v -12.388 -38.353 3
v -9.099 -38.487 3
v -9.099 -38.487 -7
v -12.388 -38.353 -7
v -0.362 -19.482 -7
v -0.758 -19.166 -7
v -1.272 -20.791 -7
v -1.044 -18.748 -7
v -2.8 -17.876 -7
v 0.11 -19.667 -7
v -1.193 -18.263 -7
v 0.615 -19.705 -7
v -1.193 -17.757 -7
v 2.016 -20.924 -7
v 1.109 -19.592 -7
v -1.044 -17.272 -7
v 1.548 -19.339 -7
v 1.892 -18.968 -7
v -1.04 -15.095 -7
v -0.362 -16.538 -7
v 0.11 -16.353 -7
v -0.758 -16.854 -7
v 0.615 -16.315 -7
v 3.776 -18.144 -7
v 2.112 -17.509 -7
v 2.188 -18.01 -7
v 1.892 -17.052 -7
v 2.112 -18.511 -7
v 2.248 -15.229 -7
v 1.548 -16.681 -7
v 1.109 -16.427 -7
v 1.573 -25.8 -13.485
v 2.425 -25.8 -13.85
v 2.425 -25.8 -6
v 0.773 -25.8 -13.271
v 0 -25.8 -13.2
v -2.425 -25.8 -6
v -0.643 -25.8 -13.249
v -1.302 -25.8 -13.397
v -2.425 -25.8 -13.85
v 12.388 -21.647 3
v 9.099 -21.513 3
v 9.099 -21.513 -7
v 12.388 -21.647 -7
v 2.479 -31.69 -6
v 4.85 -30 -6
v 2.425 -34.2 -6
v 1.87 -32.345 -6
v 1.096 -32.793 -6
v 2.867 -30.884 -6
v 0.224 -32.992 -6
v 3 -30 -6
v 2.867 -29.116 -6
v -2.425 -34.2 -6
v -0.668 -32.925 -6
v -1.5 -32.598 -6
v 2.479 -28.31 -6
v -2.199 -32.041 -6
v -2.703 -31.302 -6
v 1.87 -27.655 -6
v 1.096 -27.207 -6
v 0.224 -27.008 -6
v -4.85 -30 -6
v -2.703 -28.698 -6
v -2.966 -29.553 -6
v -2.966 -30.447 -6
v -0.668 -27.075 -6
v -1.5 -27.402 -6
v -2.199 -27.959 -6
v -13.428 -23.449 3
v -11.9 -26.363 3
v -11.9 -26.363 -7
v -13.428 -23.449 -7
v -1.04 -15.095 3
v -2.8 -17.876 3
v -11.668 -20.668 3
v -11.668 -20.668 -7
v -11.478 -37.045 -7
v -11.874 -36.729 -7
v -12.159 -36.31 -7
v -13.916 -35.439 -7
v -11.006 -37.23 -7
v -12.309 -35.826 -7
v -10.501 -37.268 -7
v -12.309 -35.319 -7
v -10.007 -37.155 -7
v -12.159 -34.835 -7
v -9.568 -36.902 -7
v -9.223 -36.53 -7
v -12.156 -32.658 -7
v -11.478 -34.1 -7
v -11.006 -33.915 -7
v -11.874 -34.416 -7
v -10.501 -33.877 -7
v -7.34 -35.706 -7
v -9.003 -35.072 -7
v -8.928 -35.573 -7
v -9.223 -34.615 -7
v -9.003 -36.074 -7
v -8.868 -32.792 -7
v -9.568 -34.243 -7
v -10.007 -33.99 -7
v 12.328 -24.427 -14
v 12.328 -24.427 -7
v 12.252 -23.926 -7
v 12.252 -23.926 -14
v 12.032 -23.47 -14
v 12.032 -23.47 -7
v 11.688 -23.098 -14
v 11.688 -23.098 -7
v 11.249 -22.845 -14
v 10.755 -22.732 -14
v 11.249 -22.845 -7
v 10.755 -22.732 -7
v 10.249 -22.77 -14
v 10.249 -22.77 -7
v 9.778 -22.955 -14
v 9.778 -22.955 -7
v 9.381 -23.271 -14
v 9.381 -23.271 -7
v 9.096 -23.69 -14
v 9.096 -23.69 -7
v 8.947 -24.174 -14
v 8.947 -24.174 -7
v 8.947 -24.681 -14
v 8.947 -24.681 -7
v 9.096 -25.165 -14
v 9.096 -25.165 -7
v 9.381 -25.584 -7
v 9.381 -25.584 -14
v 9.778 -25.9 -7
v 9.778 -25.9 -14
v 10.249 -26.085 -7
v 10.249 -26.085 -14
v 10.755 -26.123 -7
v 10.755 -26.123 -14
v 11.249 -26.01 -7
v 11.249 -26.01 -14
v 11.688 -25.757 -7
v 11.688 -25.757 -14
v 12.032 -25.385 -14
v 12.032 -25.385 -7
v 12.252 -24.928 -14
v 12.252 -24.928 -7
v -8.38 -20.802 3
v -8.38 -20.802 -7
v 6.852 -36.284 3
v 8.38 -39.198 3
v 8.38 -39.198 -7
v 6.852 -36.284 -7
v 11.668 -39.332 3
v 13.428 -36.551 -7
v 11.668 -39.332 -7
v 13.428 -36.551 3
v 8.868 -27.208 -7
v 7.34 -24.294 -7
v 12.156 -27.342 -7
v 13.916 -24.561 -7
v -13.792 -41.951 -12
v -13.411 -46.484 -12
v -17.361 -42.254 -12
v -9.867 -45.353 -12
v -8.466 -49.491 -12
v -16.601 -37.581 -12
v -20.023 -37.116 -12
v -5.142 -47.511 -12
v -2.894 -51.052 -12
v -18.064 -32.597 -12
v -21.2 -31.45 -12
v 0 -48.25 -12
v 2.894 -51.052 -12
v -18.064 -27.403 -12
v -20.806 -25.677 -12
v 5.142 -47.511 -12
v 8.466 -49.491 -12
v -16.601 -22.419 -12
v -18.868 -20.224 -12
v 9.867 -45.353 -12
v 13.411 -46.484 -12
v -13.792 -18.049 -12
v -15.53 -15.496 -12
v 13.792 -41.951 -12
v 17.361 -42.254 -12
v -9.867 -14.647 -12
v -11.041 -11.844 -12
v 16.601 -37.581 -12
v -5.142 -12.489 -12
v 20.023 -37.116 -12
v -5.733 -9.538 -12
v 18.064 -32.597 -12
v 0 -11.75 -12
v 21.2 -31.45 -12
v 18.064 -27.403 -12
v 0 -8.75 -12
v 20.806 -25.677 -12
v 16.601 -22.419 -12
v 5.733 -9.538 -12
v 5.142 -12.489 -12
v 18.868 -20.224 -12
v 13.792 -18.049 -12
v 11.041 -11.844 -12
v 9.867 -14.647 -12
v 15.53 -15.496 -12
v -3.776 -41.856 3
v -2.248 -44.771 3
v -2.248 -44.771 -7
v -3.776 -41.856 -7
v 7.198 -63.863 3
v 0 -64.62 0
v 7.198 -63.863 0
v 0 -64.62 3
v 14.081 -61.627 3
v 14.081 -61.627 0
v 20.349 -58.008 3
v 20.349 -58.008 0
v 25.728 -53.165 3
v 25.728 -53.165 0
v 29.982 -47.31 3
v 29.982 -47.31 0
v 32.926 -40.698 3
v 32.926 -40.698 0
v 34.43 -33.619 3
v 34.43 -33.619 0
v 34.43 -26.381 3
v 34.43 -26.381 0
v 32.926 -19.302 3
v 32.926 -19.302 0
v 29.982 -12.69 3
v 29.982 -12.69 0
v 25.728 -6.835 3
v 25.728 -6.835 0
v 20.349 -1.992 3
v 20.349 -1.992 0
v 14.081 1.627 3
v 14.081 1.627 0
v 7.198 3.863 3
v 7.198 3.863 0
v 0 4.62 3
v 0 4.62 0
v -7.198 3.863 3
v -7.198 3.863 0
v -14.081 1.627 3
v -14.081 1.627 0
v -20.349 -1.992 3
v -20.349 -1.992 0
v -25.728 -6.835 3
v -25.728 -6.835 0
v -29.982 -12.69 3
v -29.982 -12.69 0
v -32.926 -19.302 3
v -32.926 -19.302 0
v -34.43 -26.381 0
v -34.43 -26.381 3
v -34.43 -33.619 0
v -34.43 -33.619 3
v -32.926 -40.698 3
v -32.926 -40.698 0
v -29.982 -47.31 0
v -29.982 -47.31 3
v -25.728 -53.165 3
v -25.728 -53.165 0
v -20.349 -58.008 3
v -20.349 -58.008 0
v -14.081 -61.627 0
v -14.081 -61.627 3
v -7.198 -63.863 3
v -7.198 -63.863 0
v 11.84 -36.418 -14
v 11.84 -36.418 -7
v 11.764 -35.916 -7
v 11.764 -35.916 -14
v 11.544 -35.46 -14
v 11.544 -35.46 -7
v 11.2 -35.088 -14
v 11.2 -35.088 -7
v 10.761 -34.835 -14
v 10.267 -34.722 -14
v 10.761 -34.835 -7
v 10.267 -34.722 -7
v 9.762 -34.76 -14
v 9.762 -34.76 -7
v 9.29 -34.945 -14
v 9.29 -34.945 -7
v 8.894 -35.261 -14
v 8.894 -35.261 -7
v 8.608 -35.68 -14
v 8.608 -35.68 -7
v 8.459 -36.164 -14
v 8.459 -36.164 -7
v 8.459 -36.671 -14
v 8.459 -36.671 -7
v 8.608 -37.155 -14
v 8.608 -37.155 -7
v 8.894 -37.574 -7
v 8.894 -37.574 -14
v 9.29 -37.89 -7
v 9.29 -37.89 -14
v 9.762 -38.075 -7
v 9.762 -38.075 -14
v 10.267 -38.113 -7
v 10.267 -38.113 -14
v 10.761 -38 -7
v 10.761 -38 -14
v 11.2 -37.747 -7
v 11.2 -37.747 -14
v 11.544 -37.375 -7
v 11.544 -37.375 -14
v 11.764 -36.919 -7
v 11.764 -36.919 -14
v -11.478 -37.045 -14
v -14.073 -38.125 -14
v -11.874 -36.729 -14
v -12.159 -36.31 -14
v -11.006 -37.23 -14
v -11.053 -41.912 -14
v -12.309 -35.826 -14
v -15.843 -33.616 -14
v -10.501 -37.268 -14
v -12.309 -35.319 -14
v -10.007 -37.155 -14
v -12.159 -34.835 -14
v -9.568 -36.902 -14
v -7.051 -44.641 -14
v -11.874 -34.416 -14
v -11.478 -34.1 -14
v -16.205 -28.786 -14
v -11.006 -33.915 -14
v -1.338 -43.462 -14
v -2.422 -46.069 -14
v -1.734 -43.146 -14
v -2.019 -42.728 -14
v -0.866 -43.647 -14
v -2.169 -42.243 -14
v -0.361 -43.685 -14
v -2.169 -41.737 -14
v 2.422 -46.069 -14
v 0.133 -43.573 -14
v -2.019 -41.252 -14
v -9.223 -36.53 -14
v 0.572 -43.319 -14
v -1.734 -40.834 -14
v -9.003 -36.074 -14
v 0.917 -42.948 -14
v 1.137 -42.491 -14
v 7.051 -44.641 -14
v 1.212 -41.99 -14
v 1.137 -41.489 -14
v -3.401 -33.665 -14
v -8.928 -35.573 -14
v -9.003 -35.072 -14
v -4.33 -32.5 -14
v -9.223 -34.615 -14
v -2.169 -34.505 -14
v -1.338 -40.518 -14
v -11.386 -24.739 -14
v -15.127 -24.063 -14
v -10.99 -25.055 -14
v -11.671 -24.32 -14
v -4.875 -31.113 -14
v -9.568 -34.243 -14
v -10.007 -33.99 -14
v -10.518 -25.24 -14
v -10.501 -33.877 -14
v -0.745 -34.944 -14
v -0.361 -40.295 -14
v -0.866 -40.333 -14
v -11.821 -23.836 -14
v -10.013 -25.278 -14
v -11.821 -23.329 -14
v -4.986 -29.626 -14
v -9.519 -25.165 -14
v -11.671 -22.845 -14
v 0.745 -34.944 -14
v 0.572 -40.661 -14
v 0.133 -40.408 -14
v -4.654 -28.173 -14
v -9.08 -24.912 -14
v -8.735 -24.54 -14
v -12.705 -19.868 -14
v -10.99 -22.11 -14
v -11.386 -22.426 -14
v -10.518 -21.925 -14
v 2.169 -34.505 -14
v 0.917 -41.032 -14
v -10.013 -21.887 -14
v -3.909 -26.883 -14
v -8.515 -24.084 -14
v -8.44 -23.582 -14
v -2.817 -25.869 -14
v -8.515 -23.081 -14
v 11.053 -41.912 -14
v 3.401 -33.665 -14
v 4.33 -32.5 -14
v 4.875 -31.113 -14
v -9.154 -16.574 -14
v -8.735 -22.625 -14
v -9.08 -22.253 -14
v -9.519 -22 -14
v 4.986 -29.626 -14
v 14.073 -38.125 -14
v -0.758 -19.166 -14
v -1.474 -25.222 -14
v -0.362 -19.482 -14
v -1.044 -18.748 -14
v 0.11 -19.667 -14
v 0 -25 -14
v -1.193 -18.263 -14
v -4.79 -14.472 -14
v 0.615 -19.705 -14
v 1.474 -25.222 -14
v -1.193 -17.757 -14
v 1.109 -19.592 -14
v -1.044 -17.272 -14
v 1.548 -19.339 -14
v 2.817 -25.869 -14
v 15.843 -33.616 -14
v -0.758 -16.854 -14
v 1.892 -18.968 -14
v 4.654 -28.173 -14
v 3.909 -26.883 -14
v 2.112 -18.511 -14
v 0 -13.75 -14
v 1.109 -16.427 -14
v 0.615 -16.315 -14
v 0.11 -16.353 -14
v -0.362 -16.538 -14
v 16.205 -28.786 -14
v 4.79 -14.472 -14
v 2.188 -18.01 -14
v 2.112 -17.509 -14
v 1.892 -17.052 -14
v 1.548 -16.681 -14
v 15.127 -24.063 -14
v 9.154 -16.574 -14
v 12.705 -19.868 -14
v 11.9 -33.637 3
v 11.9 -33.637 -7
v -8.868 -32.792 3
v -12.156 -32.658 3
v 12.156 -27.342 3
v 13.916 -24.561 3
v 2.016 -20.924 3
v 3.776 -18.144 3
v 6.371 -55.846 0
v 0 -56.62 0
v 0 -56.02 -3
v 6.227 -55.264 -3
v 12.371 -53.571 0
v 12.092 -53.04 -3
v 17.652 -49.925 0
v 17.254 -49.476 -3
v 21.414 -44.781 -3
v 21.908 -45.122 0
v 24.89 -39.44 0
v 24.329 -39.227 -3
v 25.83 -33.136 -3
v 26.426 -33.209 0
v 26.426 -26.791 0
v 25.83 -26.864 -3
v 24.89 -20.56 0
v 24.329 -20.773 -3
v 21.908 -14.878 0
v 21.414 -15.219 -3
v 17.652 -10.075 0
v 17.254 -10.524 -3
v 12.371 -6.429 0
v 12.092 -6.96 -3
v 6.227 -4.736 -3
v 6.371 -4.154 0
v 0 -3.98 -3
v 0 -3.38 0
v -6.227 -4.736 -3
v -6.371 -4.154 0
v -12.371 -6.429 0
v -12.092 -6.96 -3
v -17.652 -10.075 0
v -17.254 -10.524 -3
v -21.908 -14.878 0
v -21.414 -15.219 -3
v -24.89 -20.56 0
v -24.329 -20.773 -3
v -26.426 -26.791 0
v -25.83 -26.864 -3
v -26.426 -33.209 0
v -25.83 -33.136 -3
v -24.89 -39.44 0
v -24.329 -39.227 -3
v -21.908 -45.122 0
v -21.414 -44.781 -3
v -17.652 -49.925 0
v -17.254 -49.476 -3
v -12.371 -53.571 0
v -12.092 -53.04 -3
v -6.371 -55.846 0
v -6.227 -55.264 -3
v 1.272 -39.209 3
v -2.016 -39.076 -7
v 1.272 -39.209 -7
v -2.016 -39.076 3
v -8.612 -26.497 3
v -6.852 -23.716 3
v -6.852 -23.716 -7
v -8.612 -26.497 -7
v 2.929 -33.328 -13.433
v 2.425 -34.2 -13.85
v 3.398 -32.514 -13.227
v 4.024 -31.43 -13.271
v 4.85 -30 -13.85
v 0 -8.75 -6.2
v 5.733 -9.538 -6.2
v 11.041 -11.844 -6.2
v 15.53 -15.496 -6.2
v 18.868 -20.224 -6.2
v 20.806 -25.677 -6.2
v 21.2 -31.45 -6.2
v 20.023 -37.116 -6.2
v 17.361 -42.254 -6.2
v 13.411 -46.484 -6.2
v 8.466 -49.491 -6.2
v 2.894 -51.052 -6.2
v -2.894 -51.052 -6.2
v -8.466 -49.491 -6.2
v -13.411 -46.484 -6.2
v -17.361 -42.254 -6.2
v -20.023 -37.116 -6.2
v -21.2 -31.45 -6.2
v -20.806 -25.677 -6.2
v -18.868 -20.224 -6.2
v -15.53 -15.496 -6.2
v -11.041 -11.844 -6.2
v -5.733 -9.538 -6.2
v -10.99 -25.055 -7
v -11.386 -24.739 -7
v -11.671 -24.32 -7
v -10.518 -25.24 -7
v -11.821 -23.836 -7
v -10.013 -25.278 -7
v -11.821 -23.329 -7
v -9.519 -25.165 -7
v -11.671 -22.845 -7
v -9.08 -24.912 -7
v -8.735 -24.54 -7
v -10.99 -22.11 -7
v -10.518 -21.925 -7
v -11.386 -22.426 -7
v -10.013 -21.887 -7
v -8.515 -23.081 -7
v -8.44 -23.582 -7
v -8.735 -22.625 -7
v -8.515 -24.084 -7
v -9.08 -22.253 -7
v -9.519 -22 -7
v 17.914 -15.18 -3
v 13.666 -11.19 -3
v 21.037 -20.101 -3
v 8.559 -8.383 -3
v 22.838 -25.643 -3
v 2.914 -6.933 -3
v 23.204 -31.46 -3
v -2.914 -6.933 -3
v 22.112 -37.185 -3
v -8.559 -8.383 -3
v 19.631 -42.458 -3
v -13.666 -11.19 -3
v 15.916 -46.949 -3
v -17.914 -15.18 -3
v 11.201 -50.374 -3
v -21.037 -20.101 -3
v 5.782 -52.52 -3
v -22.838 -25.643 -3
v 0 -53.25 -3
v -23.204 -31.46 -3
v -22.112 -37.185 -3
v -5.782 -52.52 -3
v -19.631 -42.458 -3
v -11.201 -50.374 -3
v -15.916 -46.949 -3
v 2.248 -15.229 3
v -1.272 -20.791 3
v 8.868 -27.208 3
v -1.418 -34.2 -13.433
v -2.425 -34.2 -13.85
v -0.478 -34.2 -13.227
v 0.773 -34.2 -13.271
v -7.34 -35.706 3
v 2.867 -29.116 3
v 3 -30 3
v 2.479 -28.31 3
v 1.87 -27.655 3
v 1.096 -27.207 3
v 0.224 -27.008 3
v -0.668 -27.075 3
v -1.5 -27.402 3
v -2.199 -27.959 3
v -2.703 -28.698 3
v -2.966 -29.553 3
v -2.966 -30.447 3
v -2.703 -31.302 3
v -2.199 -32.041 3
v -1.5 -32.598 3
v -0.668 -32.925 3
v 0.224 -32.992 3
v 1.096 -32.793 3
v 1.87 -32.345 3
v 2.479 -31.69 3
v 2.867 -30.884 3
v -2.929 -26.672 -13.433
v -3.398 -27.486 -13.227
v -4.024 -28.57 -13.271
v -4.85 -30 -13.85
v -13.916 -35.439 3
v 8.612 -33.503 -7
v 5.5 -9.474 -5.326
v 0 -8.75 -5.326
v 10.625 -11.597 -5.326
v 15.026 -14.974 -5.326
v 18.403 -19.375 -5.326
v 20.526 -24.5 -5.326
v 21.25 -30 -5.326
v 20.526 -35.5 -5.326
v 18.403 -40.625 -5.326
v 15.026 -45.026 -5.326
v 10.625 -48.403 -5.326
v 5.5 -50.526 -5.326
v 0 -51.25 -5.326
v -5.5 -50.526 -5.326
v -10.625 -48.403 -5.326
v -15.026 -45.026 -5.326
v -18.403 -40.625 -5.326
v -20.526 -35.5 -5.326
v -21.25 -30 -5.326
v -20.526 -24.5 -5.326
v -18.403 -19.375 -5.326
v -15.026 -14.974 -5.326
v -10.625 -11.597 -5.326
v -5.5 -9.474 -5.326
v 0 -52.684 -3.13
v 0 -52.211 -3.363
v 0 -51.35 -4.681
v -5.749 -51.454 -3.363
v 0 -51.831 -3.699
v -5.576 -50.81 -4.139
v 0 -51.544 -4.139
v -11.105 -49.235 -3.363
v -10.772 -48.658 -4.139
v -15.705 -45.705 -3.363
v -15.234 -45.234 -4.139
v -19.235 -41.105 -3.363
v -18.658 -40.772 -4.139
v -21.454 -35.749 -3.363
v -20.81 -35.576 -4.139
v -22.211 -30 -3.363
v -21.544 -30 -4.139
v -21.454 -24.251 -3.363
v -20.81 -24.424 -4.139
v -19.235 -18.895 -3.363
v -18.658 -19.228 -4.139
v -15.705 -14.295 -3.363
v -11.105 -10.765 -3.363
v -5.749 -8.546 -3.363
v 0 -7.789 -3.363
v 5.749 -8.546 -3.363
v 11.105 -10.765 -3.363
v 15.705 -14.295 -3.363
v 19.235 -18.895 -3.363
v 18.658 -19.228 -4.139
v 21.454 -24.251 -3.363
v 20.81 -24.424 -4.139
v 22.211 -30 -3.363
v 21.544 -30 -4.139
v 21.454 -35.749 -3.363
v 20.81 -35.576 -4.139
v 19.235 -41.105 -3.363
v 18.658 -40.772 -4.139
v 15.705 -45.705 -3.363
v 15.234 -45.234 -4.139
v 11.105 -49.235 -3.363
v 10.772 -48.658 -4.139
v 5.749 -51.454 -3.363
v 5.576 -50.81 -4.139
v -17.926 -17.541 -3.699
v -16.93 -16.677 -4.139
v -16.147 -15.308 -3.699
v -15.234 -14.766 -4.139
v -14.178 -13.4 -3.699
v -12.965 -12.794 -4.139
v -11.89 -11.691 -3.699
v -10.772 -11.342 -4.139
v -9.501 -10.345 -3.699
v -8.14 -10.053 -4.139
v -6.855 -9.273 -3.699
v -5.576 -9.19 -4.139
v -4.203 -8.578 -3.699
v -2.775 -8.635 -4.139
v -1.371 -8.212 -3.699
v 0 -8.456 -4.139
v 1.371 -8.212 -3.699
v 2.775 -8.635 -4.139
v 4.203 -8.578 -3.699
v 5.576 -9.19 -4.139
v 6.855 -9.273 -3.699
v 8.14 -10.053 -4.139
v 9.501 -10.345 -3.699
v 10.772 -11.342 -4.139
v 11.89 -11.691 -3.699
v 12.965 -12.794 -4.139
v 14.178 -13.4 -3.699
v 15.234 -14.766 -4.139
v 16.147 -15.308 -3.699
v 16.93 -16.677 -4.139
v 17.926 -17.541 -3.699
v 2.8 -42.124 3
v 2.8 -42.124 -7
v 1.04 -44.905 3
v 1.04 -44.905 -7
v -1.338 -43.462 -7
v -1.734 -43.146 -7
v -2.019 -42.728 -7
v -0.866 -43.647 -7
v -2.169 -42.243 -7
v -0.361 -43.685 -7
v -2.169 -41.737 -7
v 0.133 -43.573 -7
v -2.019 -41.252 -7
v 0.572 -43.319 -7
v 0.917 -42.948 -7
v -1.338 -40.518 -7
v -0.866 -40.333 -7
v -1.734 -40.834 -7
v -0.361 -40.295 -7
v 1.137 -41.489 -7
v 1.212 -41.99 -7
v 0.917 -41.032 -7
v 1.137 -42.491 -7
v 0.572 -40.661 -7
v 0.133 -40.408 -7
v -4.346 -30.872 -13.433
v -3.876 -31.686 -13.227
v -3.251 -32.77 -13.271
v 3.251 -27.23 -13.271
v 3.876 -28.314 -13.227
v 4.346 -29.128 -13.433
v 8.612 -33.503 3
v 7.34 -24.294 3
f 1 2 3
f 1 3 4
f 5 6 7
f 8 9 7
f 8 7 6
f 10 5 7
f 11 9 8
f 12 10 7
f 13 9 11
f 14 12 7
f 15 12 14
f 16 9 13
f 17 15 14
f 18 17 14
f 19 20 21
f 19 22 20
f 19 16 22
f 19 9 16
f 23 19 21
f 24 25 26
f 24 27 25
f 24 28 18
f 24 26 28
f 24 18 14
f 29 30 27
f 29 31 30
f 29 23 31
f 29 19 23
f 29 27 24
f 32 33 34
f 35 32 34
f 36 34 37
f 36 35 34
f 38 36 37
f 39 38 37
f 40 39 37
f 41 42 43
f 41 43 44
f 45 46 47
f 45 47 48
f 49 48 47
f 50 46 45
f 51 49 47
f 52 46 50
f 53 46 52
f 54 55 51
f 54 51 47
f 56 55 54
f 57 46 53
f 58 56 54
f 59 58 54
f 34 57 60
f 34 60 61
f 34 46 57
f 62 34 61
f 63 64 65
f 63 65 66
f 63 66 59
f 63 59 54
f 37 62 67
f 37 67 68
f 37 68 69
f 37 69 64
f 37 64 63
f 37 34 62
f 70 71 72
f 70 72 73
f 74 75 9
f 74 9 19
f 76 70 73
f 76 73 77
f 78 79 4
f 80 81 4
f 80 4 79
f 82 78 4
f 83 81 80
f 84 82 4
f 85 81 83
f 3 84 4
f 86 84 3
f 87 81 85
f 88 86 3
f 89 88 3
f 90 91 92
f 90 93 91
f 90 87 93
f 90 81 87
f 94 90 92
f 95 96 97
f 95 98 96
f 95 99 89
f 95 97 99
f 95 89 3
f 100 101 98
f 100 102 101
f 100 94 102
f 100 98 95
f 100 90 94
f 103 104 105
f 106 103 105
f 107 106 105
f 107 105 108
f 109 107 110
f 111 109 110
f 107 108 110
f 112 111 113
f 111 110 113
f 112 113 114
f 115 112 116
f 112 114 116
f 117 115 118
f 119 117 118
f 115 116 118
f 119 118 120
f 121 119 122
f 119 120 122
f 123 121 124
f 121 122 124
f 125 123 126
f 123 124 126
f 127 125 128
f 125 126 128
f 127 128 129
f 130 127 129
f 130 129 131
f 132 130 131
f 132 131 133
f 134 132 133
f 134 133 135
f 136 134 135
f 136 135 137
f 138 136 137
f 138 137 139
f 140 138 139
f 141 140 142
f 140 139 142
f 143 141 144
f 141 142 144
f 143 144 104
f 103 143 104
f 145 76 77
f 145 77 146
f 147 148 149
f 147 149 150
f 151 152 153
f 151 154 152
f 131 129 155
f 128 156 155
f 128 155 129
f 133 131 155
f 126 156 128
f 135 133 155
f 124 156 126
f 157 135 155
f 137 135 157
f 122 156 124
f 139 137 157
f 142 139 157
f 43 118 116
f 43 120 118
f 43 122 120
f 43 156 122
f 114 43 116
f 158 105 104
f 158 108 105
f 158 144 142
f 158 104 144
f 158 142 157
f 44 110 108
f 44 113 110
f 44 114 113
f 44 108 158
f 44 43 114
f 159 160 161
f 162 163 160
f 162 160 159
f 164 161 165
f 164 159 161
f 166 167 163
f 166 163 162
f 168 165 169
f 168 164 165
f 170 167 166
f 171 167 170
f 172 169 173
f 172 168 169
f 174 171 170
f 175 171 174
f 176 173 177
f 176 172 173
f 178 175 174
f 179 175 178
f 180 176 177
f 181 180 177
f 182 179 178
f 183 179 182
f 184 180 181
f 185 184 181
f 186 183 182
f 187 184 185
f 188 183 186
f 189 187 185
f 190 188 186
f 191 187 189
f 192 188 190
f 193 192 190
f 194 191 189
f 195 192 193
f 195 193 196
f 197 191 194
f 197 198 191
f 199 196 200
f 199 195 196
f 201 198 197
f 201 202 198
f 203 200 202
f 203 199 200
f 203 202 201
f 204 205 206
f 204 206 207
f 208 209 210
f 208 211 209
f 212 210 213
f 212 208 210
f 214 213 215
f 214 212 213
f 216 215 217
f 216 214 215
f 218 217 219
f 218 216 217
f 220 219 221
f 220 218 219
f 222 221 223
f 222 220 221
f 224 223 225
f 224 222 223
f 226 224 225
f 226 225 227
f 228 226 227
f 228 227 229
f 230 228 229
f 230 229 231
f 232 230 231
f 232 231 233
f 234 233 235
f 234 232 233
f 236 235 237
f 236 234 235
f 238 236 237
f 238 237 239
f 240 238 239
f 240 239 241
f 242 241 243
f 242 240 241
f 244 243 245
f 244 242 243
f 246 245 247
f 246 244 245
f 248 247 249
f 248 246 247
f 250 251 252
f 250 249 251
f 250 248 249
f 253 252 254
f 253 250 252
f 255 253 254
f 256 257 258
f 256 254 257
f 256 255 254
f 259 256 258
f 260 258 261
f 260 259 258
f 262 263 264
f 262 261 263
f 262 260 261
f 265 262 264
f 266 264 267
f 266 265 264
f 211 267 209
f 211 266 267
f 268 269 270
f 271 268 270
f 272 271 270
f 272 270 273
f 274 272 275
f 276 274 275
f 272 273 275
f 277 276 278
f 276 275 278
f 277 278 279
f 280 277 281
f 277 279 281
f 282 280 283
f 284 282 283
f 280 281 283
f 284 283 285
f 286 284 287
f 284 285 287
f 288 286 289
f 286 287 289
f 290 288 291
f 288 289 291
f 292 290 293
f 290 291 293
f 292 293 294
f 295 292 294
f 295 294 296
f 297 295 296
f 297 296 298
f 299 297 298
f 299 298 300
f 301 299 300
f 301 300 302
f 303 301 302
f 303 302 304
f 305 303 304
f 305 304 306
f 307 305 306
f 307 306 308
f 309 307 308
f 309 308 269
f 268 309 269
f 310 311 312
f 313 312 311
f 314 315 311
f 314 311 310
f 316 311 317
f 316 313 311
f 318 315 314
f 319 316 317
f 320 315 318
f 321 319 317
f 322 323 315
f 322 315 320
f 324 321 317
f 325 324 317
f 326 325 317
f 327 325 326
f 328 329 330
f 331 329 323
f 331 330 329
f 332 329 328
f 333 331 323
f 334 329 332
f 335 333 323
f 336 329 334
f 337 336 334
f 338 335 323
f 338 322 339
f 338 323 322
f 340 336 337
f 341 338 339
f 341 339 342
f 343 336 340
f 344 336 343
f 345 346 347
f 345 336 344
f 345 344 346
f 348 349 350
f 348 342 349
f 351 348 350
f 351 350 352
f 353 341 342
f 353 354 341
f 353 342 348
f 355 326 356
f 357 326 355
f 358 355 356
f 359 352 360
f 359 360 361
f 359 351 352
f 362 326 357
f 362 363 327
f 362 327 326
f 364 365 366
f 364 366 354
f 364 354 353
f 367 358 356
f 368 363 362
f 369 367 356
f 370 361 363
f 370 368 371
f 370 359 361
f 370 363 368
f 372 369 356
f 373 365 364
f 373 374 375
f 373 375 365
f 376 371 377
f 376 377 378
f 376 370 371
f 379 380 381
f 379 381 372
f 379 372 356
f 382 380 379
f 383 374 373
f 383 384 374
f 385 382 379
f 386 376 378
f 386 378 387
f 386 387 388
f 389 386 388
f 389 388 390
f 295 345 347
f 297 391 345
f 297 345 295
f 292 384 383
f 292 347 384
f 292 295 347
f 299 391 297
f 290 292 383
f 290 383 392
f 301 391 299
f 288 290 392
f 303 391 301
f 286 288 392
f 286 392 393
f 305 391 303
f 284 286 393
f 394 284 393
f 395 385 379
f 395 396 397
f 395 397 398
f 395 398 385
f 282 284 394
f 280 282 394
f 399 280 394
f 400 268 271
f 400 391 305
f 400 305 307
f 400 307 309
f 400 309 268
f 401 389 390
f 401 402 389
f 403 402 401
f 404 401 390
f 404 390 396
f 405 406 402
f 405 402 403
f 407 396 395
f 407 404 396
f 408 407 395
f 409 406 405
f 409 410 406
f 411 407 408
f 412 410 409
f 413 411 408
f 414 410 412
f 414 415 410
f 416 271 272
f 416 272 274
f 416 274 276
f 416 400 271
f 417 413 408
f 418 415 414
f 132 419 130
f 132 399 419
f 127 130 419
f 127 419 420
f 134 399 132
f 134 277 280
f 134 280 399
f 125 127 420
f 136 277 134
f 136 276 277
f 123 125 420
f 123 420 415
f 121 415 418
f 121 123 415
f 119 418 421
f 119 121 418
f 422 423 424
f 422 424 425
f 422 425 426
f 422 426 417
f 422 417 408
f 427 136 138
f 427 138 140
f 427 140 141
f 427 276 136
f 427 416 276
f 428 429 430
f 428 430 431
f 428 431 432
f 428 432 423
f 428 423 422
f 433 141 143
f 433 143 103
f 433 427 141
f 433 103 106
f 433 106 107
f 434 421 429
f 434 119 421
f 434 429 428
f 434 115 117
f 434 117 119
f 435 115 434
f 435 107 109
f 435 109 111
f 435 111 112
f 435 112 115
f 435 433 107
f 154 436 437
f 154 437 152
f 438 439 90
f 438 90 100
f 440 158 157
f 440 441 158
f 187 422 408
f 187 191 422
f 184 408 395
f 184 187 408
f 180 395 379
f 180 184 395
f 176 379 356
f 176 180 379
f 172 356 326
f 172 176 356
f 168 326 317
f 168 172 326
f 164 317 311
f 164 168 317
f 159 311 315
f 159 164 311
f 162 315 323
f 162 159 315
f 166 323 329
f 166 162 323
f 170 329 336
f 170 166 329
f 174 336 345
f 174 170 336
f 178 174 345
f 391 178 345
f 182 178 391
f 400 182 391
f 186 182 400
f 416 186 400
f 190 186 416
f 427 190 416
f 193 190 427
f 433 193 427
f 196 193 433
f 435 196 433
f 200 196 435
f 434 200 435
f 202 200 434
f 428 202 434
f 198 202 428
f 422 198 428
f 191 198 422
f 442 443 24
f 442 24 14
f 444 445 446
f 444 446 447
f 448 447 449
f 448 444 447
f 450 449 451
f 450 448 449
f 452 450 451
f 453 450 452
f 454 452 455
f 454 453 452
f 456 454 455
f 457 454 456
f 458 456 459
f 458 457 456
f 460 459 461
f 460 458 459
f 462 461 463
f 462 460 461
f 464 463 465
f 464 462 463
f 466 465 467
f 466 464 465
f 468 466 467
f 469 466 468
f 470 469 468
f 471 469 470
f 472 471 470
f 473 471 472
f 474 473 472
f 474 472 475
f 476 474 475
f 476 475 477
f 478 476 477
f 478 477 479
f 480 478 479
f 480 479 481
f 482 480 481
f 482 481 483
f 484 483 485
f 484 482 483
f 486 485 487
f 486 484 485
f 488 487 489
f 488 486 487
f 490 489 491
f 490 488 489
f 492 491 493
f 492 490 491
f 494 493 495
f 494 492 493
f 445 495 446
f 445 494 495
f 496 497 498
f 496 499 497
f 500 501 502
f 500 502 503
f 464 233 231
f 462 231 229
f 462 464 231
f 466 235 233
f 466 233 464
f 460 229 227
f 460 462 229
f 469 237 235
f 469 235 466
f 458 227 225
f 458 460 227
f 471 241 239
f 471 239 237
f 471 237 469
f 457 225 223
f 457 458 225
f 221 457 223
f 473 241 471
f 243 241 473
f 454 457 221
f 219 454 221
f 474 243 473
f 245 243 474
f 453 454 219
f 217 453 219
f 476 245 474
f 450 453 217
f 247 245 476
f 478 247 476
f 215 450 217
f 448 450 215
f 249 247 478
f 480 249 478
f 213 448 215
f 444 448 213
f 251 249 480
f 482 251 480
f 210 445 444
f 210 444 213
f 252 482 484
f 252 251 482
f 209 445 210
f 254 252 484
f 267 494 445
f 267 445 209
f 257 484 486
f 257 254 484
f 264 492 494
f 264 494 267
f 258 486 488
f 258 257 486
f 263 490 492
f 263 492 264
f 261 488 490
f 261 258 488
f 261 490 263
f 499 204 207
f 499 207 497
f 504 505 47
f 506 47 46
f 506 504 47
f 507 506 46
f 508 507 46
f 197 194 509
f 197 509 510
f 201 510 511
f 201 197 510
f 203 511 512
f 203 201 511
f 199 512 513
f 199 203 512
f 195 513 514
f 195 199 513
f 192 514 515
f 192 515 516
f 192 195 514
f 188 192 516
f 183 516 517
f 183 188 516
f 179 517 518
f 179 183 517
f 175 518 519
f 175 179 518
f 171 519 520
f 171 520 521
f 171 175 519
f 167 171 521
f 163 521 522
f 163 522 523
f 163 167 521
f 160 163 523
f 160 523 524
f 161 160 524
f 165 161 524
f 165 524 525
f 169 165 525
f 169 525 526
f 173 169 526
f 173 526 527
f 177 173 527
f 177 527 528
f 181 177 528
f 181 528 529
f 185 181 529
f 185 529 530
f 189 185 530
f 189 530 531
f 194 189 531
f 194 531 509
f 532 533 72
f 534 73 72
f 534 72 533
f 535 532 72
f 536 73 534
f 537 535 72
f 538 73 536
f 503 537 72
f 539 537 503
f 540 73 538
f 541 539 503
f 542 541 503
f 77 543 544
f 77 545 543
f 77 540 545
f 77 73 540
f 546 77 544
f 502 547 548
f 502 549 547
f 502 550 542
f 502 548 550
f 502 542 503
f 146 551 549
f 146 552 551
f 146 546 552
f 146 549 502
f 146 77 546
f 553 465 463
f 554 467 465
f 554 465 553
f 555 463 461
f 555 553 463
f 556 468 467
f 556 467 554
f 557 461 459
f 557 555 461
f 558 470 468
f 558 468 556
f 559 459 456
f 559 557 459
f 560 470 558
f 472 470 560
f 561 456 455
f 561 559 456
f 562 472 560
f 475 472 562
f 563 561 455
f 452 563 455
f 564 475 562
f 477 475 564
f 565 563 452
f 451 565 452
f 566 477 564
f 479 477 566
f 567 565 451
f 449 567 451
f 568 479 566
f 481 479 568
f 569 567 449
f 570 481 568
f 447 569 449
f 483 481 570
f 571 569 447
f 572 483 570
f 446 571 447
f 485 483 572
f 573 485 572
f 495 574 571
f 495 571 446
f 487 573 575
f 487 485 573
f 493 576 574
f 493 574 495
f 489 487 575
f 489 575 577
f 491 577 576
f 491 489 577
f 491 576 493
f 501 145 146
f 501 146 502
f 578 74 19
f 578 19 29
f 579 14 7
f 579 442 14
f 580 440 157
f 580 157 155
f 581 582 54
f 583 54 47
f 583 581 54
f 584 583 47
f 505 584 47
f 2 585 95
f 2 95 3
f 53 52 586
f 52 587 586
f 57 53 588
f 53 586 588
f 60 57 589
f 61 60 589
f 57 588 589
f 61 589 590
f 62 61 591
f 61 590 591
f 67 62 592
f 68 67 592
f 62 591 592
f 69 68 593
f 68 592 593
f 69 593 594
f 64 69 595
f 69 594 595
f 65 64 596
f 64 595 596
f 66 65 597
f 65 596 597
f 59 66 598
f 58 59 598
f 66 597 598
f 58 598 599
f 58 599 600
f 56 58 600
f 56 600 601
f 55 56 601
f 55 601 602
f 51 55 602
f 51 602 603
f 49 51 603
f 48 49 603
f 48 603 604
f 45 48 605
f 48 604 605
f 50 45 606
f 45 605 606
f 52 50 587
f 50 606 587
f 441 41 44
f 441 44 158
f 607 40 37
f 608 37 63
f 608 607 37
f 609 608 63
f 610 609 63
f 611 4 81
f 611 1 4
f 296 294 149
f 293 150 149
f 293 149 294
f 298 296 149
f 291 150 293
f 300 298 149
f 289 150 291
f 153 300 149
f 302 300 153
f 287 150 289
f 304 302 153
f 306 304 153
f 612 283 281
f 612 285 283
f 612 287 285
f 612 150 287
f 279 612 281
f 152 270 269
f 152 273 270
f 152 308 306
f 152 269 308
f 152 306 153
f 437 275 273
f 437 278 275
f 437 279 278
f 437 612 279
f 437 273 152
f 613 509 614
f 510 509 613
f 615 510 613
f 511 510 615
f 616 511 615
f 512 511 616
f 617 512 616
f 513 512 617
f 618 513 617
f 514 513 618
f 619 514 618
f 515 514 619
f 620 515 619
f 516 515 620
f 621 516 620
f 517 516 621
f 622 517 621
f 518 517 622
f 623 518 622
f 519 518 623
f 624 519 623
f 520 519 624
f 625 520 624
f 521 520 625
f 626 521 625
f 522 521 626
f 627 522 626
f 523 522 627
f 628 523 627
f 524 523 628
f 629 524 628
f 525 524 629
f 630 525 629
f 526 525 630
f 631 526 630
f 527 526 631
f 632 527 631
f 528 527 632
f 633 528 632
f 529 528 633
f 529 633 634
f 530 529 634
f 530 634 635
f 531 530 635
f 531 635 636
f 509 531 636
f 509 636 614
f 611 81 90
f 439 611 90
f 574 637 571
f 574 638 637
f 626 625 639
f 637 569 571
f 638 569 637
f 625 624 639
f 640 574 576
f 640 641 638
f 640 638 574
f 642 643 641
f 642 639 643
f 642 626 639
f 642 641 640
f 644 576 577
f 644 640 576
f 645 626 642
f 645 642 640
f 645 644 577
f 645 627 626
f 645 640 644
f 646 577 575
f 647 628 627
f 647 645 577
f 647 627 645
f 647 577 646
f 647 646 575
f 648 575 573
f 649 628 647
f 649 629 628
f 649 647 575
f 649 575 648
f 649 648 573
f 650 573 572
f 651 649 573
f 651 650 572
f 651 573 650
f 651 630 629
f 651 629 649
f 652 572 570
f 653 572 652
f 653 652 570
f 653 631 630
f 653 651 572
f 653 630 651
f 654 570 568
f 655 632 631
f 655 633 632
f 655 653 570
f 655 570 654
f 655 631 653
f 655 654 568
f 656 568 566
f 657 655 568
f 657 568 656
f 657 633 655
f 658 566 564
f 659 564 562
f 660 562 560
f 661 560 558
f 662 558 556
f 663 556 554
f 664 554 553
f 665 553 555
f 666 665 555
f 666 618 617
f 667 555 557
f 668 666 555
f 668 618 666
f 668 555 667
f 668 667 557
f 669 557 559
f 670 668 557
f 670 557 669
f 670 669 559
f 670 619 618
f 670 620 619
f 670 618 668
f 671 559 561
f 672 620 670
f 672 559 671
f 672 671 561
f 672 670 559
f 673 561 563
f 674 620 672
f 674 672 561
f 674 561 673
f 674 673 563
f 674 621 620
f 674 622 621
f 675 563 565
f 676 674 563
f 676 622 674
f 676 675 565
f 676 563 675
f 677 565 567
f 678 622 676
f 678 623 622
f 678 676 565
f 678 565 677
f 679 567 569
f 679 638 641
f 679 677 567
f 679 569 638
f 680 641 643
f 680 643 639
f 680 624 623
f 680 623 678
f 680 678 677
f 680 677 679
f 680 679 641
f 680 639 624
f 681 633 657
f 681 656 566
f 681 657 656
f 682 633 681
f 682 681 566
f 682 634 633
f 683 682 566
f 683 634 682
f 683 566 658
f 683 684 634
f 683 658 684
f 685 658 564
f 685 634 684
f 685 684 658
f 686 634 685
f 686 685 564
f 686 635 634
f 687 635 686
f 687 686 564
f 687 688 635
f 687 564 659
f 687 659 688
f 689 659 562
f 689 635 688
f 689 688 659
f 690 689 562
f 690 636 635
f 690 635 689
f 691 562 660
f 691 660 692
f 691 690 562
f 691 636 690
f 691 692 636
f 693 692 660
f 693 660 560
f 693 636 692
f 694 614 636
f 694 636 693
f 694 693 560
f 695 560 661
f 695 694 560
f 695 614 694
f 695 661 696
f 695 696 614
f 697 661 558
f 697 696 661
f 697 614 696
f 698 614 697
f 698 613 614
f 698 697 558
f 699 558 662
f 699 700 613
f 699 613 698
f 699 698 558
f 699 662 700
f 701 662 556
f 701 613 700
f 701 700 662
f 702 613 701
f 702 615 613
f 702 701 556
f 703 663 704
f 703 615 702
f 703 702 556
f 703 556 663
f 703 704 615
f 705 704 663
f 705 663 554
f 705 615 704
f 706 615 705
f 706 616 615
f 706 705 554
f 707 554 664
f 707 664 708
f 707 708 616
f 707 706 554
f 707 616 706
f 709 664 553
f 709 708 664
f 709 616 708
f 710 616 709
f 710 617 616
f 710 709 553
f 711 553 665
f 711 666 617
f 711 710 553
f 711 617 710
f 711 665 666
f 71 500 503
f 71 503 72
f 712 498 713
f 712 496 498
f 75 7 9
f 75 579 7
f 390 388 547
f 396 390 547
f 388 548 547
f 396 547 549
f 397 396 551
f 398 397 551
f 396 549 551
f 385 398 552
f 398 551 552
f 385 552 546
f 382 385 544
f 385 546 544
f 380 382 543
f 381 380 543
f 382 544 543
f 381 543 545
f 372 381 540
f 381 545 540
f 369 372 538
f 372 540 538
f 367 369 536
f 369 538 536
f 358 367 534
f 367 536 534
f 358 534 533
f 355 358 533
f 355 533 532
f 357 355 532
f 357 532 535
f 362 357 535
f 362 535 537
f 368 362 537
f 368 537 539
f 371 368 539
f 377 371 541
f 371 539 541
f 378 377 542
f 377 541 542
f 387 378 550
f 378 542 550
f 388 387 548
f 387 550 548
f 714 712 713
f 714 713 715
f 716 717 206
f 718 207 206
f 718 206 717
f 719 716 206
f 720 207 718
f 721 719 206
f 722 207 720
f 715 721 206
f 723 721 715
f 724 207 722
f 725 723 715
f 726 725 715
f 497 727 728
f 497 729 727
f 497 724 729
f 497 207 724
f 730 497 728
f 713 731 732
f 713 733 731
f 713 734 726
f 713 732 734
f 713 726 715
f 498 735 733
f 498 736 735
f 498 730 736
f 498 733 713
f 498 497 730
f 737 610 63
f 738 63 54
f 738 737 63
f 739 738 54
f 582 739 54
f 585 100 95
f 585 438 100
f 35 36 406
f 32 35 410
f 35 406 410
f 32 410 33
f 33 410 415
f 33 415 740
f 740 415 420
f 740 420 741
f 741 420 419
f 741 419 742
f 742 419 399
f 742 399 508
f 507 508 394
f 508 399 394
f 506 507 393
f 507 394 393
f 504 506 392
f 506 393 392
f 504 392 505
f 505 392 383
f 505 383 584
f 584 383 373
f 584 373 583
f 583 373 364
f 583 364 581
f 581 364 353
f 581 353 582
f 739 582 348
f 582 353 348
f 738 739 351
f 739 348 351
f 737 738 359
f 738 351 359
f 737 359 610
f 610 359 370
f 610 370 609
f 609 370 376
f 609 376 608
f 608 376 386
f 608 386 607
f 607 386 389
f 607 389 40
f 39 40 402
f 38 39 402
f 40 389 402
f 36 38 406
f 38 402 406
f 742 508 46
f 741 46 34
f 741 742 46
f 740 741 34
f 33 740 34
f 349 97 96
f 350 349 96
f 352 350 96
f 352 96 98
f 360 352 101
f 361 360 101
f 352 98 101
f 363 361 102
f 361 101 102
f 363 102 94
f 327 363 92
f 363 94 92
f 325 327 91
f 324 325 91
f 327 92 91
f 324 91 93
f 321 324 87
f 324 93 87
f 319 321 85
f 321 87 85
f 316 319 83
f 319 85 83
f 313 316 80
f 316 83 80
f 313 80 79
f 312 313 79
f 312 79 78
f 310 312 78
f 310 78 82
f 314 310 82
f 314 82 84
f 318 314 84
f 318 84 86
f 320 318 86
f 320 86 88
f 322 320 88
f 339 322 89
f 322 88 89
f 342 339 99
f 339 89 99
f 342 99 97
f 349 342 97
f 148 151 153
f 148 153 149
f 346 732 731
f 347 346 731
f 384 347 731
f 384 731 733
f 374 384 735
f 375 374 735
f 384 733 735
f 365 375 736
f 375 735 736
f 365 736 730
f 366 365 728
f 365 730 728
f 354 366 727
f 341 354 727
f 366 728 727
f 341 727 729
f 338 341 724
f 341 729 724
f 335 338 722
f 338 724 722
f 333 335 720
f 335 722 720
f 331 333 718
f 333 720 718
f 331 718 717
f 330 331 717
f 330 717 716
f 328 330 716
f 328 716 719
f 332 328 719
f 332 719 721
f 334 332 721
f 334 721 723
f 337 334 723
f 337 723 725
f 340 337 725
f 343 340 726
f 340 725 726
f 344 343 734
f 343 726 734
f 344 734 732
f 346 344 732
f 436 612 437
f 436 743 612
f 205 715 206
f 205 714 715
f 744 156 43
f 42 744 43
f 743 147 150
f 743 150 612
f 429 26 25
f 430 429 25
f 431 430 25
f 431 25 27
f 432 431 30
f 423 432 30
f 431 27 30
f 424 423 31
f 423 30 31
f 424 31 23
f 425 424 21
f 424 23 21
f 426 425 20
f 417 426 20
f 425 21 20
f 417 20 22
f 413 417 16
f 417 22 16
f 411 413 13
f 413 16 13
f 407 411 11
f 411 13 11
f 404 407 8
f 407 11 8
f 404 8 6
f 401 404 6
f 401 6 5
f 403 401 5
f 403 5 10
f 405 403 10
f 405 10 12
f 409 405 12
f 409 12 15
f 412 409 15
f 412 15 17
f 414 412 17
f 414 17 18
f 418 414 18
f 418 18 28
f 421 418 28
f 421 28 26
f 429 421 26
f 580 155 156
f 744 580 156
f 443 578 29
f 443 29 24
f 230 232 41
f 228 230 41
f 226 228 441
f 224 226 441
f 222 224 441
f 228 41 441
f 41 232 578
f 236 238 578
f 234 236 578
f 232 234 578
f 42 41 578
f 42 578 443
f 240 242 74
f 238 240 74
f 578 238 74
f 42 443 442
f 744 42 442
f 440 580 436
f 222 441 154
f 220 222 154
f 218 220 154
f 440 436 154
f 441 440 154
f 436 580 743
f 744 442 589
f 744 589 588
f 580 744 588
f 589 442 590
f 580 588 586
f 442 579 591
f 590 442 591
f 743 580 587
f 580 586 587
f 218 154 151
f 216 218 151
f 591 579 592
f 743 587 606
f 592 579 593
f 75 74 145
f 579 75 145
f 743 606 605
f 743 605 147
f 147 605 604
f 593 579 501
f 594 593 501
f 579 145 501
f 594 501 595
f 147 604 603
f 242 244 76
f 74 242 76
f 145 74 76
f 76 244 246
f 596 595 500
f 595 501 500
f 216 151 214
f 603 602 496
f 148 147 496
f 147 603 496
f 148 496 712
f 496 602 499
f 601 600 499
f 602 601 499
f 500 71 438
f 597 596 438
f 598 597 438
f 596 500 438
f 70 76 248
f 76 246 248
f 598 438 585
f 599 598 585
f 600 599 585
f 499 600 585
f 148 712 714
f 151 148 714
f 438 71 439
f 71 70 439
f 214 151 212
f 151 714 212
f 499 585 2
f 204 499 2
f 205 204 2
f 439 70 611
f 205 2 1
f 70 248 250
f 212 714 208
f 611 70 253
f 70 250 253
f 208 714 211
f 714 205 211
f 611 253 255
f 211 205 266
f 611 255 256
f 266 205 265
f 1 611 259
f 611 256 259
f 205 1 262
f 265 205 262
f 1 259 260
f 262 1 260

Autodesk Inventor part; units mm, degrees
ref_plane "YZ Plane" through (0, 0, 0) normal (1, 0, 0) x (0, 1, 0)
ref_plane "XZ Plane" through (0, 0, 0) normal (0, 1, 0) x (-1, 0, 0)
ref_plane "XY Plane" through (0, 0, 0) normal (0, 0, 1) x (1, 0, 0)
sketch "Эскиз1" plane through (0, 0, 0) normal (1, 0, 0) x (0, 1, 0)
  line L0 (-3.98, -3) -> (-3.38, 0)
  line L1 (-3.98, -3) -> (-56.02, -3) projected
  line L2 (-4.48, -22.93) -> (-4.48, -3)
  line L3 (-55.52, -22.93) -> (-55.52, -3)
  line L4 (-3.98, -3) -> (-56.02, -3) projected
  line L5 (-56.02, -3) -> (-56.62, 0)
  line L6 (-60, 0) -> (0, 0) projected
  line L7 (-60, 0) -> (-60, -22.93)
  line L8 (0, 0) -> (0, -22.93)
  line L9 (-60, -22.93) -> (0, -22.93) projected
  line L10 (-3.98, -3) -> (-3.98, -3)
  line L11 (-3.98, -3) -> (-3.38, 0)
  line L12 (-56.02, -3) -> (-56.02, -3)
  line L13 (-56.02, -3) -> (-56.62, 0)
  line L14 (-3.38, 0) -> (4.62, 0)
  line L15 (-56.62, 0) -> (-64.62, 0)
  line L16 (-64.62, 0) -> (-64.62, 3)
  line L17 (-64.62, 3) -> (4.62, 3)
  line L18 (4.62, 3) -> (4.62, 0)
  line L19 (-30, -3) -> (-51.25, -3)
  line L20 (-51.25, -3) -> (-8.75, -3)
  line L21 (-8.75, -3) -> (-8.75, -22.93)
  line L22 (-51.25, -3) -> (-51.25, -22.93)
  line L23 (-52.5, -22.93) -> (-51.25, -22.93)
  line L24 (-51.5625, -21.93) -> (-51.5625, -22.93)
  line L25 (-51.875, -21.93) -> (-51.25, -21.93)
  line L26 (-52.5, -22.93) -> (-51.25, -20.93)
  spline S0 degree 2 poles (-52.5, -22.93) (-51.1297, -22.7543) (-51.25, -20.93) knots 0 0 0 1 1 1
  line L27 (-8.75, -19) -> (-8.75, -12)
  line L28 (-8.75, -12) -> (-51.25, -12)
  line L29 (-30, 3) -> (-30, -22.93)
  line L30 (-8.75, -12) -> (-11.75, -12)
  line L31 (-30, -12) -> (-30, -14)
  line L32 (-11.75, -12) -> (-13.75, -14)
  line L33 (-11.75, -12) -> (-8.9216, -12) construction
  line L34 (-13.75, -14) -> (-30, -14)
  line L35 (2, 0) -> (0, 0)
  line L36 (-7.75, -4.6) -> (-8.75, -4.6)
  line L37 (-8.25, -4.6) -> (-8.25, -3)
  line L38 (-6.75, -3) -> (-8.75, -3)
  line L39 (-6.75, -3) -> (-8.75, -6.2)
  spline S1 degree 2 poles (-6.75, -3) (-8.9425, -3.2811) (-8.75, -6.2) knots 0 0 0 1 1 1
  spline S2 degree 2 poles (-53.25, -3) (-51.0575, -3.2811) (-51.25, -6.2) knots 0 0 0 1 1 1
  line L40 (-30, -14) -> (-25, -14)
  line L41 (-25, -14) -> (-27, -12)
  point P0 (-51.5625, -22.43)
  point P1 (-30, -15.93)
  point P2 (1.4531, 0)
  point P3 (-8.25, -3.8)
  point P4 (-51.75, -3.8)
  point P5 (-30, -3)
  point P6 (-53.25, -3)
  point P7 (-51.25, -5.3265)
  point P8 (-8.75, -5.3265)
  dimension "d0" = 0
  dimension "d1" = 0
  dimension "d2" = 8
  dimension "d3" = 8
  dimension "d4" = 3
  dimension "d5" = 21.25
  dimension "d6" = 42.5
  dimension "d11" = 7
  dimension "d13" = 3
  dimension "d14" = 2
  dimension "d15" = 135
  dimension "d20" = 0
  dimension "d21" = 0
  dimension "d22" = 9
  dimension "d23" = 5
revolve "Вращение1" add sketch "Эскиз1" angle 360 about axis through (0, -30, 3) along (0, 0, -1) contours L29 L1 L5 L6 | L6 L15 L16 L17 L29 | L1 L21 S1 L28 L29 | L22 S2 L1 | L28 L32 L34 L41
sketch "Эскиз4" plane through (0, -30, 3) normal (0, 0, 1) x (1, 0, 0)
  line L0 (-1.2721, 9.2093) -> (-2.8003, 12.1239) projected
  line L1 (-2.8003, 12.1239) -> (-1.0404, 14.9046) projected
  line L2 (-1.0404, 14.9046) -> (2.2478, 14.7708) projected
  line L3 (2.2478, 14.7708) -> (3.776, 11.8563) projected
  line L4 (3.776, 11.8563) -> (2.0161, 9.0755) projected
  line L5 (2.0161, 9.0755) -> (-1.2721, 9.2093) projected
  circle A0 centre (0.4878, 11.9901) radius 1.7 projected
  line L6 (-11.8997, 3.6368) -> (-13.428, 6.5513) projected
  line L7 (-13.428, 6.5513) -> (-11.668, 9.3321) projected
  line L8 (-11.668, 9.3321) -> (-8.3798, 9.1983) projected
  line L9 (-8.3798, 9.1983) -> (-6.8516, 6.2837) projected
  line L10 (-6.8516, 6.2837) -> (-8.6116, 3.503) projected
  line L11 (-8.6116, 3.503) -> (-11.8997, 3.6368) projected
  line L12 (-9.0994, -8.4871) -> (-12.3876, -8.3533) projected
  line L13 (-12.3876, -8.3533) -> (-13.9158, -5.4388) projected
  line L14 (-13.9158, -5.4388) -> (-12.1559, -2.658) projected
  line L15 (-12.1559, -2.658) -> (-8.8677, -2.7918) projected
  line L16 (-8.8677, -2.7918) -> (-7.3395, -5.7063) projected
  line L17 (-7.3395, -5.7063) -> (-9.0994, -8.4871) projected
  line L18 (2.8003, -12.1239) -> (1.0404, -14.9046) projected
  line L19 (1.0404, -14.9046) -> (-2.2478, -14.7708) projected
  line L20 (-2.2478, -14.7708) -> (-3.776, -11.8563) projected
  line L21 (-3.776, -11.8563) -> (-2.0161, -9.0755) projected
  line L22 (-2.0161, -9.0755) -> (1.2721, -9.2093) projected
  line L23 (1.2721, -9.2093) -> (2.8003, -12.1239) projected
  line L24 (11.8997, -3.6368) -> (13.428, -6.5513) projected
  line L25 (13.428, -6.5513) -> (11.668, -9.3321) projected
  line L26 (11.668, -9.3321) -> (8.3798, -9.1983) projected
  line L27 (8.3798, -9.1983) -> (6.8516, -6.2837) projected
  line L28 (6.8516, -6.2837) -> (8.6116, -3.503) projected
  line L29 (8.6116, -3.503) -> (11.8997, -3.6368) projected
  line L30 (9.0994, 8.4871) -> (12.3876, 8.3533) projected
  line L31 (12.3876, 8.3533) -> (13.9158, 5.4388) projected
  line L32 (13.9158, 5.4388) -> (12.1559, 2.658) projected
  line L33 (12.1559, 2.658) -> (8.8677, 2.7918) projected
  line L34 (8.8677, 2.7918) -> (7.3395, 5.7063) projected
  line L35 (7.3395, 5.7063) -> (9.0994, 8.4871) projected
  point P0 (0, 30)
extrude "Выдавливание3" cut sketch "Эскиз4" against normal blind 10 contours L0 L1 L2 L3 L4 L5 | A0 | L6 L7 L8 L9 L10 L11 | L12 L13 L14 L15 L16 L17 | L18 L19 L20 L21 L22 L23 | L24 L25 L26 L27 L28 L29 | L30 L31 L32 L33 L34 L35
sketch "Эскиз5" plane through (0, -30, -7) normal (0, 0, 1) x (1, 0, 0)
  circle A0 centre (0.4878, 11.9901) radius 1.7 projected
  circle A1 centre (10.6276, 5.5726) radius 1.7 projected
  circle A2 centre (10.1398, -6.4175) radius 1.7 projected
  circle A3 centre (-0.4878, -11.9901) radius 1.7 projected
  circle A4 centre (-10.6276, -5.5726) radius 1.7 projected
  circle A5 centre (-10.1398, 6.4175) radius 1.7 projected
  point P0 (0, 30)
extrude "Выдавливание4" cut sketch "Эскиз5" against normal blind 10
sketch "Эскиз6" plane through (0, -30, 3) normal (0, 0, 1) x (1, 0, 0)
  circle A0 centre (0, 0) radius 3
  point P0 (0, 30)
  dimension "d28" = 6
extrude "Выдавливание5" cut sketch "Эскиз6" against normal blind 20
sketch "Эскиз7" plane through (0, -30, -14) normal (0, 0, -1) x (-1, 0, 0)
  line L0 (0, 0) -> (0, 4.2)
  line L1 (2.4249, 4.2) -> (4.8497, 0)
  line L2 (4.8497, 0) -> (2.4249, -4.2)
  line L3 (2.4249, -4.2) -> (-2.4249, -4.2)
  line L4 (-2.4249, -4.2) -> (-4.8497, 0)
  line L5 (-4.8497, 0) -> (-2.4249, 4.2)
  line L6 (-2.4249, 4.2) -> (2.4249, 4.2)
  point P0 (0, 30)
  dimension "d31" = 4.2
extrude "Выдавливание6" cut sketch "Эскиз7" against normal blind 8
properties part number "tire vtulka2"
